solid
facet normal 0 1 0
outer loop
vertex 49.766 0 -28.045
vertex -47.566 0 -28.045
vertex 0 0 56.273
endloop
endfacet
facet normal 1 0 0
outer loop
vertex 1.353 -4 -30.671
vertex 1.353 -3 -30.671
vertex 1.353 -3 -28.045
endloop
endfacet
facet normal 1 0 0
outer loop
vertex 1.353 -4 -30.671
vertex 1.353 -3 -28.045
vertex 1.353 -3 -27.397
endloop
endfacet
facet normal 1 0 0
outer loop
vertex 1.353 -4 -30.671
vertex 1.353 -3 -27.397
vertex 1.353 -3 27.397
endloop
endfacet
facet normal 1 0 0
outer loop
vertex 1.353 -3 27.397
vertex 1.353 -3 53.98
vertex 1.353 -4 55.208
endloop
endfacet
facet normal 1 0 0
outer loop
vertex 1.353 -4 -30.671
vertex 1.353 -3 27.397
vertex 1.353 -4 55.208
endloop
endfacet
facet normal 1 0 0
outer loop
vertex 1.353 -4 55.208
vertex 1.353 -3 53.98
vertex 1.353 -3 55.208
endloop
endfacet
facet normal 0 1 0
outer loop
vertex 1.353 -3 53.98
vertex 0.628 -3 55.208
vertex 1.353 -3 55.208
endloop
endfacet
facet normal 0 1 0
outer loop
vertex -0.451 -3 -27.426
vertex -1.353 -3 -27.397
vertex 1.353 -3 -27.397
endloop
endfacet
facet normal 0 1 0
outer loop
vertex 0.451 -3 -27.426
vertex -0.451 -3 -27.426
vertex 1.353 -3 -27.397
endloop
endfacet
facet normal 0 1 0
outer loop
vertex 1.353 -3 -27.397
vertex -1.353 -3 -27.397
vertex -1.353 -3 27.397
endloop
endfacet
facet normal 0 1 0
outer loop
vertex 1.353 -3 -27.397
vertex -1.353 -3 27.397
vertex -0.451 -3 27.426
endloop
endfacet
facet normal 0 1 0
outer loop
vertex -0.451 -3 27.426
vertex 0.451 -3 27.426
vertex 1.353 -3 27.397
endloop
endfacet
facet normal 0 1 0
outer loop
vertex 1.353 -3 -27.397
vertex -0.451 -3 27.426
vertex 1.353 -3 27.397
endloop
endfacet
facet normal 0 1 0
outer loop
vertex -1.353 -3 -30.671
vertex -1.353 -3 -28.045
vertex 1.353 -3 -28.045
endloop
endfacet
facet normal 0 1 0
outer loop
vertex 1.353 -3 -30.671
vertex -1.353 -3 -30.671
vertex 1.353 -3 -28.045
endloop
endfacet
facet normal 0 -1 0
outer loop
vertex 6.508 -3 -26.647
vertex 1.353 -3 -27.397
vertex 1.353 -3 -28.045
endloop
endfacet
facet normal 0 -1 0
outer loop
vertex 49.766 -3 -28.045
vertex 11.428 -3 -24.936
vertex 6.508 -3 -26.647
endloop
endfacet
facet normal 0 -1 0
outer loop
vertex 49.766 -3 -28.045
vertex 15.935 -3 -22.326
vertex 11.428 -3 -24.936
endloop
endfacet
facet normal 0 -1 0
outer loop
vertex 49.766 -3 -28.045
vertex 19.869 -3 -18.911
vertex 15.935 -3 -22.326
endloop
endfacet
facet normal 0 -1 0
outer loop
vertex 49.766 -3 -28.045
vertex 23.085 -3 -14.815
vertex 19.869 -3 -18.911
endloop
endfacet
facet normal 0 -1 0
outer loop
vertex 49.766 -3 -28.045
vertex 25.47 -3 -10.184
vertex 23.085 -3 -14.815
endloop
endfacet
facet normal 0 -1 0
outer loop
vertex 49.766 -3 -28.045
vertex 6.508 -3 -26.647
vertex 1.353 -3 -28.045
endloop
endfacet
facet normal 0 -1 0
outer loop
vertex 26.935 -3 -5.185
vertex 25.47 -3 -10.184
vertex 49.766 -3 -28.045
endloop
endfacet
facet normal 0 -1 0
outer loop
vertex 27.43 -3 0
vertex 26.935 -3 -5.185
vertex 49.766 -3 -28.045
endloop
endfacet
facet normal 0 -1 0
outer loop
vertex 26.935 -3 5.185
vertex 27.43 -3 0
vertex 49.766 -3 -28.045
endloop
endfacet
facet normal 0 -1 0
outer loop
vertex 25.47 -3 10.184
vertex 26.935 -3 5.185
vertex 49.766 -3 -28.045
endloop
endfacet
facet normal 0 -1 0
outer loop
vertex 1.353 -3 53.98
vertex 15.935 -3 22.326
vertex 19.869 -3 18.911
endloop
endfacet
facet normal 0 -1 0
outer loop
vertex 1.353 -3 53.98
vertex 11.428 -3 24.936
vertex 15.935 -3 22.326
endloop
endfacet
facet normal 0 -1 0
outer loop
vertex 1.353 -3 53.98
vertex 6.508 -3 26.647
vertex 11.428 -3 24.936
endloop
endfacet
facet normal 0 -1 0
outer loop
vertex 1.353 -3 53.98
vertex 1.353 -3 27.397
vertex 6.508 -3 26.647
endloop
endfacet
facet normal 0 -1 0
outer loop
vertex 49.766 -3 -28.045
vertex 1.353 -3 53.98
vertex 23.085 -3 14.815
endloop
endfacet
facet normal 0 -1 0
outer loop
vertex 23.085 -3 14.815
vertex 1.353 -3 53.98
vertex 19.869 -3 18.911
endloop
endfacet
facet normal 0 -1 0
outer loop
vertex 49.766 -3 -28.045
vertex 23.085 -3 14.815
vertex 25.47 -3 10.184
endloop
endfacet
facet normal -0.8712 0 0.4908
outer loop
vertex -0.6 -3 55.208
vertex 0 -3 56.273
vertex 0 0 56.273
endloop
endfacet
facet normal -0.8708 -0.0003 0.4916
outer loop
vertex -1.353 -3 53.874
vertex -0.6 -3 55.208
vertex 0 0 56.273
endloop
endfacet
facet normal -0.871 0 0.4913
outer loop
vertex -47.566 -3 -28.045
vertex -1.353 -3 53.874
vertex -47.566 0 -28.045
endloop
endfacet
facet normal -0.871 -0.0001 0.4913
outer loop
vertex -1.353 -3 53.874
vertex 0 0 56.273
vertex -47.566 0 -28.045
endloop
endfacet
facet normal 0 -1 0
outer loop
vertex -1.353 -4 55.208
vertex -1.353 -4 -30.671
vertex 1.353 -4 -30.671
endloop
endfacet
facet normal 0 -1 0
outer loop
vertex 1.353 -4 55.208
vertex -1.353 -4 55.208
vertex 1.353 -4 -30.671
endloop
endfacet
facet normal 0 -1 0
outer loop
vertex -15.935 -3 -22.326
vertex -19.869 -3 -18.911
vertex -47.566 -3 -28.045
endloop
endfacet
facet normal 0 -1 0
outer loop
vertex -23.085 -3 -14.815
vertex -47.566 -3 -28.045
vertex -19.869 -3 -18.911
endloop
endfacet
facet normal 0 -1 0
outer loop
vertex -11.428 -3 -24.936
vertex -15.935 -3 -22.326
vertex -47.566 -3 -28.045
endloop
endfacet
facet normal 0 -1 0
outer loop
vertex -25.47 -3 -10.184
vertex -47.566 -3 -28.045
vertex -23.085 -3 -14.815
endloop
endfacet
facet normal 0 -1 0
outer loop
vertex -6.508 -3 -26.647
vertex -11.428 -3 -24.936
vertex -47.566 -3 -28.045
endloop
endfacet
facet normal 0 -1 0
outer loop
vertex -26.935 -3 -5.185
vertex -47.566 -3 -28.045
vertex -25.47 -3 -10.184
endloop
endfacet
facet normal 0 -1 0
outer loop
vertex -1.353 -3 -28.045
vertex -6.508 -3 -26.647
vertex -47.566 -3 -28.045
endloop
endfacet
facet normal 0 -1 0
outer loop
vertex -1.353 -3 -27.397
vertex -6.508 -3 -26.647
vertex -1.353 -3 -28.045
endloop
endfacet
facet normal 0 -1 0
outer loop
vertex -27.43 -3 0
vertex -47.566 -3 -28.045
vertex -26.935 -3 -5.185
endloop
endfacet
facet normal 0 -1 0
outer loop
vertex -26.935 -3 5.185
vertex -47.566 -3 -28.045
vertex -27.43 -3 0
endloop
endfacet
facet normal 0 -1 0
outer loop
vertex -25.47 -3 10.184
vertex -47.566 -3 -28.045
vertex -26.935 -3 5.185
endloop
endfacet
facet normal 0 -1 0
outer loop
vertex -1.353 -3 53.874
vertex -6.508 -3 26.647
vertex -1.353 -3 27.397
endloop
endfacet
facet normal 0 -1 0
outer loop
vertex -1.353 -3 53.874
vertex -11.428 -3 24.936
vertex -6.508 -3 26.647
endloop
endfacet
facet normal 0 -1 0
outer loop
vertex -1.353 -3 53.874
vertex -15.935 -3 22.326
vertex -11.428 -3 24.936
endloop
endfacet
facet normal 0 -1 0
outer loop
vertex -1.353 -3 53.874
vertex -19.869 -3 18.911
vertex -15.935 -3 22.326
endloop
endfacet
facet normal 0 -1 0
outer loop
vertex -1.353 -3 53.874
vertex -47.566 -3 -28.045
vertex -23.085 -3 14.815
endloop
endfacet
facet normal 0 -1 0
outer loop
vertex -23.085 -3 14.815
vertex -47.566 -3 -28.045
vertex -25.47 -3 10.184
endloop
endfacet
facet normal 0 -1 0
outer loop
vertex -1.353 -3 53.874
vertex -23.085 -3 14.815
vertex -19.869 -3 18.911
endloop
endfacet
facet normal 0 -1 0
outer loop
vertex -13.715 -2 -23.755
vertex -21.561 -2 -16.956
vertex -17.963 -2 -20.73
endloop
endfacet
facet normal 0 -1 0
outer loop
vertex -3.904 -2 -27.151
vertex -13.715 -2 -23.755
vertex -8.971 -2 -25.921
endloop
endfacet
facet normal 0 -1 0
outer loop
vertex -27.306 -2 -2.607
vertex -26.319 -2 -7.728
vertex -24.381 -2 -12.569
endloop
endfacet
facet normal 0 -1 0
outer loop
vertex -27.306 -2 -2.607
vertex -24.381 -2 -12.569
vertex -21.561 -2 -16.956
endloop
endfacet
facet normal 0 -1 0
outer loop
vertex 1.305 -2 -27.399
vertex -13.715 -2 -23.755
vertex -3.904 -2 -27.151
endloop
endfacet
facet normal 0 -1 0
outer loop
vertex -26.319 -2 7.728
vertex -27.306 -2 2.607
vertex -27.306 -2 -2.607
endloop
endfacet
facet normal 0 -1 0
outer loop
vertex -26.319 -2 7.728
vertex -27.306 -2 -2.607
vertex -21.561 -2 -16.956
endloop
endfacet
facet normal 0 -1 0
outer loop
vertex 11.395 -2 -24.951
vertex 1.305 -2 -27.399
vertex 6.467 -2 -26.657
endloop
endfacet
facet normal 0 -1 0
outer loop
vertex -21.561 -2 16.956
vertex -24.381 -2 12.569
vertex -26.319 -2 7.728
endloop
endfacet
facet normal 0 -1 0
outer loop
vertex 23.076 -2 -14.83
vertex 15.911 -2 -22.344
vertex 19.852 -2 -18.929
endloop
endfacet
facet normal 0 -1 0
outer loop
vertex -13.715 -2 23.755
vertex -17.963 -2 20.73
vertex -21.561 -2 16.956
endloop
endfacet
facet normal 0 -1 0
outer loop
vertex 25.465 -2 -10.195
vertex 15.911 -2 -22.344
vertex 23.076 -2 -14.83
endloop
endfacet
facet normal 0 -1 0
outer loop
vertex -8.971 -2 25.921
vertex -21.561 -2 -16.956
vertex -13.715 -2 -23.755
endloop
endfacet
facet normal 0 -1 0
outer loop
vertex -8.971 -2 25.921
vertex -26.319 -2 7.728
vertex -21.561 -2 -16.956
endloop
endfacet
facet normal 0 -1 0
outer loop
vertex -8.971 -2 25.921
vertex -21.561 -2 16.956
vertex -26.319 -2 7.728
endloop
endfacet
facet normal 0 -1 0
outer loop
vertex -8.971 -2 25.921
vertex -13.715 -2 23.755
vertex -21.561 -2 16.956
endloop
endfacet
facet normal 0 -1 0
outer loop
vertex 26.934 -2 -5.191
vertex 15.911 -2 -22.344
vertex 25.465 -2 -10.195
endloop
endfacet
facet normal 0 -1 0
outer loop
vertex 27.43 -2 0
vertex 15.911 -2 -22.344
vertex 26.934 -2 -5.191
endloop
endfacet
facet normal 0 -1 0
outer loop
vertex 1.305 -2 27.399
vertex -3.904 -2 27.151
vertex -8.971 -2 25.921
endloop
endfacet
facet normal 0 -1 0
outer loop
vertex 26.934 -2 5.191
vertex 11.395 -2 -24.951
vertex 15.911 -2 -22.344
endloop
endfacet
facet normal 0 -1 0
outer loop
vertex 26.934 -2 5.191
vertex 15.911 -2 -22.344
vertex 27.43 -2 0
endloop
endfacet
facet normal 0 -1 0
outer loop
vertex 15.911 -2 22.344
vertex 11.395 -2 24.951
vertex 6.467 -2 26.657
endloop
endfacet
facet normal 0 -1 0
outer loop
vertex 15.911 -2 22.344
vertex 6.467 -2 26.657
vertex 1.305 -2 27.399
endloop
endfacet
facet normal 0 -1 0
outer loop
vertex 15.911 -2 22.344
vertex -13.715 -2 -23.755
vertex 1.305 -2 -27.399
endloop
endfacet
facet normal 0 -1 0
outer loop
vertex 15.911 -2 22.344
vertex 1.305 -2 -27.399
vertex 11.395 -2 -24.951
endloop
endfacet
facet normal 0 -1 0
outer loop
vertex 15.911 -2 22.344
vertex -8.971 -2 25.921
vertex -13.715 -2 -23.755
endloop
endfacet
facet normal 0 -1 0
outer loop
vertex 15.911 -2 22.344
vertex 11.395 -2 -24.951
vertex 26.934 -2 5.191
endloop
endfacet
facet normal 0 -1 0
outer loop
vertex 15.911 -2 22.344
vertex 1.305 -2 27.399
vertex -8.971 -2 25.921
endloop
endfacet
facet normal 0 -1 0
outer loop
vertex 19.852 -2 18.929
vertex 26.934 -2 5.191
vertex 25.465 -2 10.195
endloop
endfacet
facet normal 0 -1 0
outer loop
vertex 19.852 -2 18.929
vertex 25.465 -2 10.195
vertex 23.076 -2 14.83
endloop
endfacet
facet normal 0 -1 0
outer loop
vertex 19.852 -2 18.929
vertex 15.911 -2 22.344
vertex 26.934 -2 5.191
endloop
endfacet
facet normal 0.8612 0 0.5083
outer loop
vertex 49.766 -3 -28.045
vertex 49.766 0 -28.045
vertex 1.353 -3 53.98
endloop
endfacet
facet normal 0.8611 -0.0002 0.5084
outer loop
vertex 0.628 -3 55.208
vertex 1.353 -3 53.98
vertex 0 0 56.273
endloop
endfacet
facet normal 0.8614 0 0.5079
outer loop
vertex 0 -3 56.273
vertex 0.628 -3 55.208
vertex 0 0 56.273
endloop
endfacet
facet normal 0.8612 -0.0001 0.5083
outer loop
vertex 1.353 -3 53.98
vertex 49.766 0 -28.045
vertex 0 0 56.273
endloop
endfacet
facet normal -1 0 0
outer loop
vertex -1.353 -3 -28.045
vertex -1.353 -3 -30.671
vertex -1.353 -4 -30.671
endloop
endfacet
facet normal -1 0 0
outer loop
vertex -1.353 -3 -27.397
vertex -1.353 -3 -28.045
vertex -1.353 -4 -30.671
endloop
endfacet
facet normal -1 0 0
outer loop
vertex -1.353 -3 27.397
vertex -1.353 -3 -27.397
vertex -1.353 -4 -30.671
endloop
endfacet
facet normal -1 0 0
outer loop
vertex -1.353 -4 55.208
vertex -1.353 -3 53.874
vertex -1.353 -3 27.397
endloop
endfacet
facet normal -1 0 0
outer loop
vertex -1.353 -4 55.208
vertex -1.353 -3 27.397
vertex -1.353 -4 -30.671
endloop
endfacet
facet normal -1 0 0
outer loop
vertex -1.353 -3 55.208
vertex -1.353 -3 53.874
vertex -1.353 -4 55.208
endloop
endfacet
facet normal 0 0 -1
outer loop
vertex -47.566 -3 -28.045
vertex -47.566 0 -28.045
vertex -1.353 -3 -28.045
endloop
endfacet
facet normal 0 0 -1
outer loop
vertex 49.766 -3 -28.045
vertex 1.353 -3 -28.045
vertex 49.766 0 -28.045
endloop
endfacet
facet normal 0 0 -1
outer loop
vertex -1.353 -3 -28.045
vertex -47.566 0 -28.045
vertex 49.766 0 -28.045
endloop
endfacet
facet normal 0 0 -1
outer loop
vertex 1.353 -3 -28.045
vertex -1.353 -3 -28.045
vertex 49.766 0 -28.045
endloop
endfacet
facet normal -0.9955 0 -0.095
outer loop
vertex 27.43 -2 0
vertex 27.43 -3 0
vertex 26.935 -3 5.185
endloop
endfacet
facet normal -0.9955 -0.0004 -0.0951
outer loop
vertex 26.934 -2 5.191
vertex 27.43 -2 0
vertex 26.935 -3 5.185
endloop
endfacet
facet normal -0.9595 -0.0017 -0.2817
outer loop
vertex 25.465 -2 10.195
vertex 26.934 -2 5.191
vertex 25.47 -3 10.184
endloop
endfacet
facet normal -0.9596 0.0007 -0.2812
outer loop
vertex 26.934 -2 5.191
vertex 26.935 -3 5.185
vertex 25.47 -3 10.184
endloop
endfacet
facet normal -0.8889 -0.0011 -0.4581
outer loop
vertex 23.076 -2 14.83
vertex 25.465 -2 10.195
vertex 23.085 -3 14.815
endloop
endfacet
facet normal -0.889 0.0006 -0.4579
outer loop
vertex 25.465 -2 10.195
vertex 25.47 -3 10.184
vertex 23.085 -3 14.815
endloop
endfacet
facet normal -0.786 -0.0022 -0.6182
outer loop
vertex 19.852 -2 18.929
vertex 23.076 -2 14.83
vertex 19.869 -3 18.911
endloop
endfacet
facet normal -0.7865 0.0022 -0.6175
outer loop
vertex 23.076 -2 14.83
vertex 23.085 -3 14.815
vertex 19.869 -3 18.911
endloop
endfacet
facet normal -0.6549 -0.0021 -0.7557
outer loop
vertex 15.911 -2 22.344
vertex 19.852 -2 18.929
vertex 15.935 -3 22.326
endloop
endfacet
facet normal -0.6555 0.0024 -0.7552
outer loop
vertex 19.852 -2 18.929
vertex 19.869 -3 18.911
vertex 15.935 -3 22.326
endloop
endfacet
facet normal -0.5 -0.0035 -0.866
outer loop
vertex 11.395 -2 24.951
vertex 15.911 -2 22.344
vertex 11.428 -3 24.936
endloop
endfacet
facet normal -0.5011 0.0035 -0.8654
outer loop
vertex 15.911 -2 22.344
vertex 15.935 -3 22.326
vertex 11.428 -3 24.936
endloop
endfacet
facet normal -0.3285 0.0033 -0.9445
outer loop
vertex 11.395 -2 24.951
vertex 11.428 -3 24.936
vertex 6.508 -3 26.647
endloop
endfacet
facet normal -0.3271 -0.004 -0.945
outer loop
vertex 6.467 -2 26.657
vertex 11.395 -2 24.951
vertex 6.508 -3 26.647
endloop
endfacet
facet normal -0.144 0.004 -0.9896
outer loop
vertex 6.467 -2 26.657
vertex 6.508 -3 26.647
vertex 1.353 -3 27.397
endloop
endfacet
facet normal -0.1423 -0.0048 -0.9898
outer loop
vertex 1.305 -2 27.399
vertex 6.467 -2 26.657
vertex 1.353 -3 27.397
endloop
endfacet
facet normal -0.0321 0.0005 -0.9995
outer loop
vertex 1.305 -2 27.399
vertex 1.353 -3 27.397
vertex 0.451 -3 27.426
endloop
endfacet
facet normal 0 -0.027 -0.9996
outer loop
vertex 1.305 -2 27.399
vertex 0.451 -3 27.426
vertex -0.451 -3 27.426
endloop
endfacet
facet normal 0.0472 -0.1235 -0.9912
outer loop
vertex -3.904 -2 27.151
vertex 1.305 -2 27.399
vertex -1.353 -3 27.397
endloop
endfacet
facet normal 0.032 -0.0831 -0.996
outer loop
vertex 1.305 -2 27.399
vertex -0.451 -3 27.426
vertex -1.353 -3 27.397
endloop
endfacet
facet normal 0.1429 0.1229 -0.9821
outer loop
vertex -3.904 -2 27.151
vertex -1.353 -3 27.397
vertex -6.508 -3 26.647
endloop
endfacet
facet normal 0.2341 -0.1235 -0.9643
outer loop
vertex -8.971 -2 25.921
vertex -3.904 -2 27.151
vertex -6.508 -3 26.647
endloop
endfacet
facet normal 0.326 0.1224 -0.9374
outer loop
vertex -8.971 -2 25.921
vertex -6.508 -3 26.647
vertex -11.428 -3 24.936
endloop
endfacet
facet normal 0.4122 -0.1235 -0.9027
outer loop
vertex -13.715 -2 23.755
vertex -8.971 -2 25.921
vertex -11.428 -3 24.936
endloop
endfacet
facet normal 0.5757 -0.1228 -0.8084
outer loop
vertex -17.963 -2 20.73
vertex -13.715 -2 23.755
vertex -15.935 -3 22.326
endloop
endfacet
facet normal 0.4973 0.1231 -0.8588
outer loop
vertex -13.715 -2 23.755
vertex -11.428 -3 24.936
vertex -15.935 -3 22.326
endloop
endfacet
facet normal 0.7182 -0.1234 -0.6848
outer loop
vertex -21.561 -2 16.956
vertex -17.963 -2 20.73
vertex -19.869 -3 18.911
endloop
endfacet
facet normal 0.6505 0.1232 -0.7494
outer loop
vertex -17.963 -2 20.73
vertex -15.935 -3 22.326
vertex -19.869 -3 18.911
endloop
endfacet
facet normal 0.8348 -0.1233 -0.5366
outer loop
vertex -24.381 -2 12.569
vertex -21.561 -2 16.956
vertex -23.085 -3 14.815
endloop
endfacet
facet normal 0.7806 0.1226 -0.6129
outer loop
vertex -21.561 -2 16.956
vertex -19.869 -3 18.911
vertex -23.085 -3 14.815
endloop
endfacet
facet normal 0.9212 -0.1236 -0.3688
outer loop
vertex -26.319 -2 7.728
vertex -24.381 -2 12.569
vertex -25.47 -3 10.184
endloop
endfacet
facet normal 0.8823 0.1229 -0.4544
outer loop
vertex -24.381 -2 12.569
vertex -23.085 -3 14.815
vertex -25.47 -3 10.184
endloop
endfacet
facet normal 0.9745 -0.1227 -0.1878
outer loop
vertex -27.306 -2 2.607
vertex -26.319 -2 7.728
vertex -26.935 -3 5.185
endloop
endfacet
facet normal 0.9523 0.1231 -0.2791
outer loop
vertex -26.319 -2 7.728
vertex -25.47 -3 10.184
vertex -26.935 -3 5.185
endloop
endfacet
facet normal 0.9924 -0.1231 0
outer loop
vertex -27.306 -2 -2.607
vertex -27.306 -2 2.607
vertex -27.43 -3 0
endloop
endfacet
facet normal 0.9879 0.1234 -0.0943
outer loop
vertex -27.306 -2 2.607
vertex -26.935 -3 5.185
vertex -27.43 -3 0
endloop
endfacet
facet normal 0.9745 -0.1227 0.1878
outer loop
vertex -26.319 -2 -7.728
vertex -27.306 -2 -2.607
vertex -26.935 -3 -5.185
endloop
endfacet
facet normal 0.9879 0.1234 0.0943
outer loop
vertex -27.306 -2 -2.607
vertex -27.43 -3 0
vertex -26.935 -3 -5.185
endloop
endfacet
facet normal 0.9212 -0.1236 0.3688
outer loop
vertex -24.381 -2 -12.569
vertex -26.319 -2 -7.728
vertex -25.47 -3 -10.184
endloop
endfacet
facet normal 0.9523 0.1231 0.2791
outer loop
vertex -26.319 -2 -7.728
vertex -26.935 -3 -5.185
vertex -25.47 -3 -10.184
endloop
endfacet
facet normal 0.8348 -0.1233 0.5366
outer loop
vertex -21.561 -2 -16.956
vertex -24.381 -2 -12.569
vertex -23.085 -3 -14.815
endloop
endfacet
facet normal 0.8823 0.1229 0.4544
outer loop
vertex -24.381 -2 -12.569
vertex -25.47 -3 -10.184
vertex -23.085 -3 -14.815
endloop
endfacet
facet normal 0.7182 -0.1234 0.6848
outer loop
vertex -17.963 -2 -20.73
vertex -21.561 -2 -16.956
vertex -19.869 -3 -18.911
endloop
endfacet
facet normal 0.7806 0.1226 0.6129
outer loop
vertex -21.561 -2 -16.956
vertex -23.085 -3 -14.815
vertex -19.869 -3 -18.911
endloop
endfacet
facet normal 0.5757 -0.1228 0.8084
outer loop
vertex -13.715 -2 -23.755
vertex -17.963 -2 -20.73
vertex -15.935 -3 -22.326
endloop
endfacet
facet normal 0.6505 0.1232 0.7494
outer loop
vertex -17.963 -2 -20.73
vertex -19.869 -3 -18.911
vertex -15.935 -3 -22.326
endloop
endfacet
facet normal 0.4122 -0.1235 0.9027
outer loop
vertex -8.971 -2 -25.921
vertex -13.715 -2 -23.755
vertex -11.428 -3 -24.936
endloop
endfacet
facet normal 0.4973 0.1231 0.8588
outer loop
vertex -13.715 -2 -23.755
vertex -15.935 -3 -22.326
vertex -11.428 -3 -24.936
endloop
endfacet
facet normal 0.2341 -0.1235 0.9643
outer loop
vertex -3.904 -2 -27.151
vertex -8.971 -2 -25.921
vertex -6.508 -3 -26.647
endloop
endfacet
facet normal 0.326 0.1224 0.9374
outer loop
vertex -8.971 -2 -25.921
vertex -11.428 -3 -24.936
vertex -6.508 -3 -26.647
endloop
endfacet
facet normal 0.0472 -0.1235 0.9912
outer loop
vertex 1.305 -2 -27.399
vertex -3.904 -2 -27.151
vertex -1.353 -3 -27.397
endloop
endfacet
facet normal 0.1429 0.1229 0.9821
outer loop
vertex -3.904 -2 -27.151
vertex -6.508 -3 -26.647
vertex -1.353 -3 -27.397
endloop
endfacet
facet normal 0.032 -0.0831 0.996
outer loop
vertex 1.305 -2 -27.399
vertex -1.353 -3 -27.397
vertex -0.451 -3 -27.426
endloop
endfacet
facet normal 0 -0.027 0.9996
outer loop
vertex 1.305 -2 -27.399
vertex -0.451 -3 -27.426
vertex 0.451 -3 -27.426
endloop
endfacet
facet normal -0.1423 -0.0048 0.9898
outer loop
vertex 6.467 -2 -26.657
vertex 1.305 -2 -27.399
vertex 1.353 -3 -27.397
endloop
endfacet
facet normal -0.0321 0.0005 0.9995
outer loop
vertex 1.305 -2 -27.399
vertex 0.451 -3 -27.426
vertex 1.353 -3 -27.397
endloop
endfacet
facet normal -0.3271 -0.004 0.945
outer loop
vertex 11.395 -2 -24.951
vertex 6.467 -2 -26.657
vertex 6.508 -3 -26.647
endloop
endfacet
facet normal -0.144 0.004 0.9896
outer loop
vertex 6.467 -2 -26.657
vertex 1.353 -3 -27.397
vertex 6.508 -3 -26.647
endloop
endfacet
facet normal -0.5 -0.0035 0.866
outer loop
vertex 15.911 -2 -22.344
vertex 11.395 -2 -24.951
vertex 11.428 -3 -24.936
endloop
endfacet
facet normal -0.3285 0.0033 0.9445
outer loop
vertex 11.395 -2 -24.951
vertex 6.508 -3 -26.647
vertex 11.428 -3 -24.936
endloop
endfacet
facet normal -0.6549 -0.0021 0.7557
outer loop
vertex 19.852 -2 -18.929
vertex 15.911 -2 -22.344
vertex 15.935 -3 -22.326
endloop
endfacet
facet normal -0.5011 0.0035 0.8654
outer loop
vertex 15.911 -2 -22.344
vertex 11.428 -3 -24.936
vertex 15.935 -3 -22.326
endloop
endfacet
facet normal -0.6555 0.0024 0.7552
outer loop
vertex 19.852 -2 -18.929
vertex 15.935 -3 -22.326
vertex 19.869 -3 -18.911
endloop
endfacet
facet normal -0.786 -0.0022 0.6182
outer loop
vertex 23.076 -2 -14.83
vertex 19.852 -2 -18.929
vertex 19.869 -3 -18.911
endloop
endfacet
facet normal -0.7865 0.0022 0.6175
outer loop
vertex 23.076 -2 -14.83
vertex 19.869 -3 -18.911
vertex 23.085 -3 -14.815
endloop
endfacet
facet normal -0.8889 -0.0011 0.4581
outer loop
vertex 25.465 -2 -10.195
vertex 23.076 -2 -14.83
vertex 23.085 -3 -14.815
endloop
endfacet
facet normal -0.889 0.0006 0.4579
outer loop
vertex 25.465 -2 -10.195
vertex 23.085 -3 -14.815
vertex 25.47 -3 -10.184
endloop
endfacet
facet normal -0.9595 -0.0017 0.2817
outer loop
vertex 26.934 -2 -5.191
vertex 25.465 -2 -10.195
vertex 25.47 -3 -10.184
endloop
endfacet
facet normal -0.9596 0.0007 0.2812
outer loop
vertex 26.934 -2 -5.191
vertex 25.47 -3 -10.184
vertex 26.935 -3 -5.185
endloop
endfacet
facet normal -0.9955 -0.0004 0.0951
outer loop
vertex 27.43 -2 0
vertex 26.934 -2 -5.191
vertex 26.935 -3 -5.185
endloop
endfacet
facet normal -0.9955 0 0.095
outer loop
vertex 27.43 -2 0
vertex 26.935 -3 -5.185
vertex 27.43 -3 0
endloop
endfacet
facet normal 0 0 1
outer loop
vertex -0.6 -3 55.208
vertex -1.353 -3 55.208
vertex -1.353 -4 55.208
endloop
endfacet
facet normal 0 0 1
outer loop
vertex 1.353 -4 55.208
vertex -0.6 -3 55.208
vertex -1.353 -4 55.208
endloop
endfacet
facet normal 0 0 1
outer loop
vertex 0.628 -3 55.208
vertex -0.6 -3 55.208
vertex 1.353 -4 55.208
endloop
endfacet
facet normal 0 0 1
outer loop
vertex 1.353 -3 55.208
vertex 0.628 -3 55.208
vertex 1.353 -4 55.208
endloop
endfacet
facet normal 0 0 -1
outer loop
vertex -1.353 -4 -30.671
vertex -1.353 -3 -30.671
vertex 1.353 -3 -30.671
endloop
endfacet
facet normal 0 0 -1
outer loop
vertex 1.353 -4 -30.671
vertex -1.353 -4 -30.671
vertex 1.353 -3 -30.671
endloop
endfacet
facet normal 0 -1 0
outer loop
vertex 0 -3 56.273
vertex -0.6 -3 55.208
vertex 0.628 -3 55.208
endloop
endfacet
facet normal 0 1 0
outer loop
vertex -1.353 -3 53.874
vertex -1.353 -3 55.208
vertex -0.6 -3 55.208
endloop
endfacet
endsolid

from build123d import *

# Parameters (mm, degrees)
F1_DEPTH = 3
F2_R     = 27.42995
F3_DEPTH = 1
F5_W     = 2.706106
F5_H     = 85.87949
F6_DEPTH = 1


with BuildPart() as f1:
    # F0 (on Front) → F1 (new body)
    with BuildSketch(Plane.XZ):
        Polygon((0, 56.272782), (-47.566082, -28.044742), (49.765669, -28.044742), align=None)
    extrude(amount=F1_DEPTH)

    # F2 (on face) → F3 (cut)
    with BuildSketch(Plane.XZ.offset(3)):
        Circle(F2_R)
    extrude(amount=-F3_DEPTH, mode=Mode.SUBTRACT)

    # F5 (on face) → F6 (join)
    with BuildSketch(Plane.XZ.offset(3)):
        with Locations((0, 12.268752)):
            Rectangle(F5_W, F5_H)
    extrude(amount=F6_DEPTH)


solid = f1.part
